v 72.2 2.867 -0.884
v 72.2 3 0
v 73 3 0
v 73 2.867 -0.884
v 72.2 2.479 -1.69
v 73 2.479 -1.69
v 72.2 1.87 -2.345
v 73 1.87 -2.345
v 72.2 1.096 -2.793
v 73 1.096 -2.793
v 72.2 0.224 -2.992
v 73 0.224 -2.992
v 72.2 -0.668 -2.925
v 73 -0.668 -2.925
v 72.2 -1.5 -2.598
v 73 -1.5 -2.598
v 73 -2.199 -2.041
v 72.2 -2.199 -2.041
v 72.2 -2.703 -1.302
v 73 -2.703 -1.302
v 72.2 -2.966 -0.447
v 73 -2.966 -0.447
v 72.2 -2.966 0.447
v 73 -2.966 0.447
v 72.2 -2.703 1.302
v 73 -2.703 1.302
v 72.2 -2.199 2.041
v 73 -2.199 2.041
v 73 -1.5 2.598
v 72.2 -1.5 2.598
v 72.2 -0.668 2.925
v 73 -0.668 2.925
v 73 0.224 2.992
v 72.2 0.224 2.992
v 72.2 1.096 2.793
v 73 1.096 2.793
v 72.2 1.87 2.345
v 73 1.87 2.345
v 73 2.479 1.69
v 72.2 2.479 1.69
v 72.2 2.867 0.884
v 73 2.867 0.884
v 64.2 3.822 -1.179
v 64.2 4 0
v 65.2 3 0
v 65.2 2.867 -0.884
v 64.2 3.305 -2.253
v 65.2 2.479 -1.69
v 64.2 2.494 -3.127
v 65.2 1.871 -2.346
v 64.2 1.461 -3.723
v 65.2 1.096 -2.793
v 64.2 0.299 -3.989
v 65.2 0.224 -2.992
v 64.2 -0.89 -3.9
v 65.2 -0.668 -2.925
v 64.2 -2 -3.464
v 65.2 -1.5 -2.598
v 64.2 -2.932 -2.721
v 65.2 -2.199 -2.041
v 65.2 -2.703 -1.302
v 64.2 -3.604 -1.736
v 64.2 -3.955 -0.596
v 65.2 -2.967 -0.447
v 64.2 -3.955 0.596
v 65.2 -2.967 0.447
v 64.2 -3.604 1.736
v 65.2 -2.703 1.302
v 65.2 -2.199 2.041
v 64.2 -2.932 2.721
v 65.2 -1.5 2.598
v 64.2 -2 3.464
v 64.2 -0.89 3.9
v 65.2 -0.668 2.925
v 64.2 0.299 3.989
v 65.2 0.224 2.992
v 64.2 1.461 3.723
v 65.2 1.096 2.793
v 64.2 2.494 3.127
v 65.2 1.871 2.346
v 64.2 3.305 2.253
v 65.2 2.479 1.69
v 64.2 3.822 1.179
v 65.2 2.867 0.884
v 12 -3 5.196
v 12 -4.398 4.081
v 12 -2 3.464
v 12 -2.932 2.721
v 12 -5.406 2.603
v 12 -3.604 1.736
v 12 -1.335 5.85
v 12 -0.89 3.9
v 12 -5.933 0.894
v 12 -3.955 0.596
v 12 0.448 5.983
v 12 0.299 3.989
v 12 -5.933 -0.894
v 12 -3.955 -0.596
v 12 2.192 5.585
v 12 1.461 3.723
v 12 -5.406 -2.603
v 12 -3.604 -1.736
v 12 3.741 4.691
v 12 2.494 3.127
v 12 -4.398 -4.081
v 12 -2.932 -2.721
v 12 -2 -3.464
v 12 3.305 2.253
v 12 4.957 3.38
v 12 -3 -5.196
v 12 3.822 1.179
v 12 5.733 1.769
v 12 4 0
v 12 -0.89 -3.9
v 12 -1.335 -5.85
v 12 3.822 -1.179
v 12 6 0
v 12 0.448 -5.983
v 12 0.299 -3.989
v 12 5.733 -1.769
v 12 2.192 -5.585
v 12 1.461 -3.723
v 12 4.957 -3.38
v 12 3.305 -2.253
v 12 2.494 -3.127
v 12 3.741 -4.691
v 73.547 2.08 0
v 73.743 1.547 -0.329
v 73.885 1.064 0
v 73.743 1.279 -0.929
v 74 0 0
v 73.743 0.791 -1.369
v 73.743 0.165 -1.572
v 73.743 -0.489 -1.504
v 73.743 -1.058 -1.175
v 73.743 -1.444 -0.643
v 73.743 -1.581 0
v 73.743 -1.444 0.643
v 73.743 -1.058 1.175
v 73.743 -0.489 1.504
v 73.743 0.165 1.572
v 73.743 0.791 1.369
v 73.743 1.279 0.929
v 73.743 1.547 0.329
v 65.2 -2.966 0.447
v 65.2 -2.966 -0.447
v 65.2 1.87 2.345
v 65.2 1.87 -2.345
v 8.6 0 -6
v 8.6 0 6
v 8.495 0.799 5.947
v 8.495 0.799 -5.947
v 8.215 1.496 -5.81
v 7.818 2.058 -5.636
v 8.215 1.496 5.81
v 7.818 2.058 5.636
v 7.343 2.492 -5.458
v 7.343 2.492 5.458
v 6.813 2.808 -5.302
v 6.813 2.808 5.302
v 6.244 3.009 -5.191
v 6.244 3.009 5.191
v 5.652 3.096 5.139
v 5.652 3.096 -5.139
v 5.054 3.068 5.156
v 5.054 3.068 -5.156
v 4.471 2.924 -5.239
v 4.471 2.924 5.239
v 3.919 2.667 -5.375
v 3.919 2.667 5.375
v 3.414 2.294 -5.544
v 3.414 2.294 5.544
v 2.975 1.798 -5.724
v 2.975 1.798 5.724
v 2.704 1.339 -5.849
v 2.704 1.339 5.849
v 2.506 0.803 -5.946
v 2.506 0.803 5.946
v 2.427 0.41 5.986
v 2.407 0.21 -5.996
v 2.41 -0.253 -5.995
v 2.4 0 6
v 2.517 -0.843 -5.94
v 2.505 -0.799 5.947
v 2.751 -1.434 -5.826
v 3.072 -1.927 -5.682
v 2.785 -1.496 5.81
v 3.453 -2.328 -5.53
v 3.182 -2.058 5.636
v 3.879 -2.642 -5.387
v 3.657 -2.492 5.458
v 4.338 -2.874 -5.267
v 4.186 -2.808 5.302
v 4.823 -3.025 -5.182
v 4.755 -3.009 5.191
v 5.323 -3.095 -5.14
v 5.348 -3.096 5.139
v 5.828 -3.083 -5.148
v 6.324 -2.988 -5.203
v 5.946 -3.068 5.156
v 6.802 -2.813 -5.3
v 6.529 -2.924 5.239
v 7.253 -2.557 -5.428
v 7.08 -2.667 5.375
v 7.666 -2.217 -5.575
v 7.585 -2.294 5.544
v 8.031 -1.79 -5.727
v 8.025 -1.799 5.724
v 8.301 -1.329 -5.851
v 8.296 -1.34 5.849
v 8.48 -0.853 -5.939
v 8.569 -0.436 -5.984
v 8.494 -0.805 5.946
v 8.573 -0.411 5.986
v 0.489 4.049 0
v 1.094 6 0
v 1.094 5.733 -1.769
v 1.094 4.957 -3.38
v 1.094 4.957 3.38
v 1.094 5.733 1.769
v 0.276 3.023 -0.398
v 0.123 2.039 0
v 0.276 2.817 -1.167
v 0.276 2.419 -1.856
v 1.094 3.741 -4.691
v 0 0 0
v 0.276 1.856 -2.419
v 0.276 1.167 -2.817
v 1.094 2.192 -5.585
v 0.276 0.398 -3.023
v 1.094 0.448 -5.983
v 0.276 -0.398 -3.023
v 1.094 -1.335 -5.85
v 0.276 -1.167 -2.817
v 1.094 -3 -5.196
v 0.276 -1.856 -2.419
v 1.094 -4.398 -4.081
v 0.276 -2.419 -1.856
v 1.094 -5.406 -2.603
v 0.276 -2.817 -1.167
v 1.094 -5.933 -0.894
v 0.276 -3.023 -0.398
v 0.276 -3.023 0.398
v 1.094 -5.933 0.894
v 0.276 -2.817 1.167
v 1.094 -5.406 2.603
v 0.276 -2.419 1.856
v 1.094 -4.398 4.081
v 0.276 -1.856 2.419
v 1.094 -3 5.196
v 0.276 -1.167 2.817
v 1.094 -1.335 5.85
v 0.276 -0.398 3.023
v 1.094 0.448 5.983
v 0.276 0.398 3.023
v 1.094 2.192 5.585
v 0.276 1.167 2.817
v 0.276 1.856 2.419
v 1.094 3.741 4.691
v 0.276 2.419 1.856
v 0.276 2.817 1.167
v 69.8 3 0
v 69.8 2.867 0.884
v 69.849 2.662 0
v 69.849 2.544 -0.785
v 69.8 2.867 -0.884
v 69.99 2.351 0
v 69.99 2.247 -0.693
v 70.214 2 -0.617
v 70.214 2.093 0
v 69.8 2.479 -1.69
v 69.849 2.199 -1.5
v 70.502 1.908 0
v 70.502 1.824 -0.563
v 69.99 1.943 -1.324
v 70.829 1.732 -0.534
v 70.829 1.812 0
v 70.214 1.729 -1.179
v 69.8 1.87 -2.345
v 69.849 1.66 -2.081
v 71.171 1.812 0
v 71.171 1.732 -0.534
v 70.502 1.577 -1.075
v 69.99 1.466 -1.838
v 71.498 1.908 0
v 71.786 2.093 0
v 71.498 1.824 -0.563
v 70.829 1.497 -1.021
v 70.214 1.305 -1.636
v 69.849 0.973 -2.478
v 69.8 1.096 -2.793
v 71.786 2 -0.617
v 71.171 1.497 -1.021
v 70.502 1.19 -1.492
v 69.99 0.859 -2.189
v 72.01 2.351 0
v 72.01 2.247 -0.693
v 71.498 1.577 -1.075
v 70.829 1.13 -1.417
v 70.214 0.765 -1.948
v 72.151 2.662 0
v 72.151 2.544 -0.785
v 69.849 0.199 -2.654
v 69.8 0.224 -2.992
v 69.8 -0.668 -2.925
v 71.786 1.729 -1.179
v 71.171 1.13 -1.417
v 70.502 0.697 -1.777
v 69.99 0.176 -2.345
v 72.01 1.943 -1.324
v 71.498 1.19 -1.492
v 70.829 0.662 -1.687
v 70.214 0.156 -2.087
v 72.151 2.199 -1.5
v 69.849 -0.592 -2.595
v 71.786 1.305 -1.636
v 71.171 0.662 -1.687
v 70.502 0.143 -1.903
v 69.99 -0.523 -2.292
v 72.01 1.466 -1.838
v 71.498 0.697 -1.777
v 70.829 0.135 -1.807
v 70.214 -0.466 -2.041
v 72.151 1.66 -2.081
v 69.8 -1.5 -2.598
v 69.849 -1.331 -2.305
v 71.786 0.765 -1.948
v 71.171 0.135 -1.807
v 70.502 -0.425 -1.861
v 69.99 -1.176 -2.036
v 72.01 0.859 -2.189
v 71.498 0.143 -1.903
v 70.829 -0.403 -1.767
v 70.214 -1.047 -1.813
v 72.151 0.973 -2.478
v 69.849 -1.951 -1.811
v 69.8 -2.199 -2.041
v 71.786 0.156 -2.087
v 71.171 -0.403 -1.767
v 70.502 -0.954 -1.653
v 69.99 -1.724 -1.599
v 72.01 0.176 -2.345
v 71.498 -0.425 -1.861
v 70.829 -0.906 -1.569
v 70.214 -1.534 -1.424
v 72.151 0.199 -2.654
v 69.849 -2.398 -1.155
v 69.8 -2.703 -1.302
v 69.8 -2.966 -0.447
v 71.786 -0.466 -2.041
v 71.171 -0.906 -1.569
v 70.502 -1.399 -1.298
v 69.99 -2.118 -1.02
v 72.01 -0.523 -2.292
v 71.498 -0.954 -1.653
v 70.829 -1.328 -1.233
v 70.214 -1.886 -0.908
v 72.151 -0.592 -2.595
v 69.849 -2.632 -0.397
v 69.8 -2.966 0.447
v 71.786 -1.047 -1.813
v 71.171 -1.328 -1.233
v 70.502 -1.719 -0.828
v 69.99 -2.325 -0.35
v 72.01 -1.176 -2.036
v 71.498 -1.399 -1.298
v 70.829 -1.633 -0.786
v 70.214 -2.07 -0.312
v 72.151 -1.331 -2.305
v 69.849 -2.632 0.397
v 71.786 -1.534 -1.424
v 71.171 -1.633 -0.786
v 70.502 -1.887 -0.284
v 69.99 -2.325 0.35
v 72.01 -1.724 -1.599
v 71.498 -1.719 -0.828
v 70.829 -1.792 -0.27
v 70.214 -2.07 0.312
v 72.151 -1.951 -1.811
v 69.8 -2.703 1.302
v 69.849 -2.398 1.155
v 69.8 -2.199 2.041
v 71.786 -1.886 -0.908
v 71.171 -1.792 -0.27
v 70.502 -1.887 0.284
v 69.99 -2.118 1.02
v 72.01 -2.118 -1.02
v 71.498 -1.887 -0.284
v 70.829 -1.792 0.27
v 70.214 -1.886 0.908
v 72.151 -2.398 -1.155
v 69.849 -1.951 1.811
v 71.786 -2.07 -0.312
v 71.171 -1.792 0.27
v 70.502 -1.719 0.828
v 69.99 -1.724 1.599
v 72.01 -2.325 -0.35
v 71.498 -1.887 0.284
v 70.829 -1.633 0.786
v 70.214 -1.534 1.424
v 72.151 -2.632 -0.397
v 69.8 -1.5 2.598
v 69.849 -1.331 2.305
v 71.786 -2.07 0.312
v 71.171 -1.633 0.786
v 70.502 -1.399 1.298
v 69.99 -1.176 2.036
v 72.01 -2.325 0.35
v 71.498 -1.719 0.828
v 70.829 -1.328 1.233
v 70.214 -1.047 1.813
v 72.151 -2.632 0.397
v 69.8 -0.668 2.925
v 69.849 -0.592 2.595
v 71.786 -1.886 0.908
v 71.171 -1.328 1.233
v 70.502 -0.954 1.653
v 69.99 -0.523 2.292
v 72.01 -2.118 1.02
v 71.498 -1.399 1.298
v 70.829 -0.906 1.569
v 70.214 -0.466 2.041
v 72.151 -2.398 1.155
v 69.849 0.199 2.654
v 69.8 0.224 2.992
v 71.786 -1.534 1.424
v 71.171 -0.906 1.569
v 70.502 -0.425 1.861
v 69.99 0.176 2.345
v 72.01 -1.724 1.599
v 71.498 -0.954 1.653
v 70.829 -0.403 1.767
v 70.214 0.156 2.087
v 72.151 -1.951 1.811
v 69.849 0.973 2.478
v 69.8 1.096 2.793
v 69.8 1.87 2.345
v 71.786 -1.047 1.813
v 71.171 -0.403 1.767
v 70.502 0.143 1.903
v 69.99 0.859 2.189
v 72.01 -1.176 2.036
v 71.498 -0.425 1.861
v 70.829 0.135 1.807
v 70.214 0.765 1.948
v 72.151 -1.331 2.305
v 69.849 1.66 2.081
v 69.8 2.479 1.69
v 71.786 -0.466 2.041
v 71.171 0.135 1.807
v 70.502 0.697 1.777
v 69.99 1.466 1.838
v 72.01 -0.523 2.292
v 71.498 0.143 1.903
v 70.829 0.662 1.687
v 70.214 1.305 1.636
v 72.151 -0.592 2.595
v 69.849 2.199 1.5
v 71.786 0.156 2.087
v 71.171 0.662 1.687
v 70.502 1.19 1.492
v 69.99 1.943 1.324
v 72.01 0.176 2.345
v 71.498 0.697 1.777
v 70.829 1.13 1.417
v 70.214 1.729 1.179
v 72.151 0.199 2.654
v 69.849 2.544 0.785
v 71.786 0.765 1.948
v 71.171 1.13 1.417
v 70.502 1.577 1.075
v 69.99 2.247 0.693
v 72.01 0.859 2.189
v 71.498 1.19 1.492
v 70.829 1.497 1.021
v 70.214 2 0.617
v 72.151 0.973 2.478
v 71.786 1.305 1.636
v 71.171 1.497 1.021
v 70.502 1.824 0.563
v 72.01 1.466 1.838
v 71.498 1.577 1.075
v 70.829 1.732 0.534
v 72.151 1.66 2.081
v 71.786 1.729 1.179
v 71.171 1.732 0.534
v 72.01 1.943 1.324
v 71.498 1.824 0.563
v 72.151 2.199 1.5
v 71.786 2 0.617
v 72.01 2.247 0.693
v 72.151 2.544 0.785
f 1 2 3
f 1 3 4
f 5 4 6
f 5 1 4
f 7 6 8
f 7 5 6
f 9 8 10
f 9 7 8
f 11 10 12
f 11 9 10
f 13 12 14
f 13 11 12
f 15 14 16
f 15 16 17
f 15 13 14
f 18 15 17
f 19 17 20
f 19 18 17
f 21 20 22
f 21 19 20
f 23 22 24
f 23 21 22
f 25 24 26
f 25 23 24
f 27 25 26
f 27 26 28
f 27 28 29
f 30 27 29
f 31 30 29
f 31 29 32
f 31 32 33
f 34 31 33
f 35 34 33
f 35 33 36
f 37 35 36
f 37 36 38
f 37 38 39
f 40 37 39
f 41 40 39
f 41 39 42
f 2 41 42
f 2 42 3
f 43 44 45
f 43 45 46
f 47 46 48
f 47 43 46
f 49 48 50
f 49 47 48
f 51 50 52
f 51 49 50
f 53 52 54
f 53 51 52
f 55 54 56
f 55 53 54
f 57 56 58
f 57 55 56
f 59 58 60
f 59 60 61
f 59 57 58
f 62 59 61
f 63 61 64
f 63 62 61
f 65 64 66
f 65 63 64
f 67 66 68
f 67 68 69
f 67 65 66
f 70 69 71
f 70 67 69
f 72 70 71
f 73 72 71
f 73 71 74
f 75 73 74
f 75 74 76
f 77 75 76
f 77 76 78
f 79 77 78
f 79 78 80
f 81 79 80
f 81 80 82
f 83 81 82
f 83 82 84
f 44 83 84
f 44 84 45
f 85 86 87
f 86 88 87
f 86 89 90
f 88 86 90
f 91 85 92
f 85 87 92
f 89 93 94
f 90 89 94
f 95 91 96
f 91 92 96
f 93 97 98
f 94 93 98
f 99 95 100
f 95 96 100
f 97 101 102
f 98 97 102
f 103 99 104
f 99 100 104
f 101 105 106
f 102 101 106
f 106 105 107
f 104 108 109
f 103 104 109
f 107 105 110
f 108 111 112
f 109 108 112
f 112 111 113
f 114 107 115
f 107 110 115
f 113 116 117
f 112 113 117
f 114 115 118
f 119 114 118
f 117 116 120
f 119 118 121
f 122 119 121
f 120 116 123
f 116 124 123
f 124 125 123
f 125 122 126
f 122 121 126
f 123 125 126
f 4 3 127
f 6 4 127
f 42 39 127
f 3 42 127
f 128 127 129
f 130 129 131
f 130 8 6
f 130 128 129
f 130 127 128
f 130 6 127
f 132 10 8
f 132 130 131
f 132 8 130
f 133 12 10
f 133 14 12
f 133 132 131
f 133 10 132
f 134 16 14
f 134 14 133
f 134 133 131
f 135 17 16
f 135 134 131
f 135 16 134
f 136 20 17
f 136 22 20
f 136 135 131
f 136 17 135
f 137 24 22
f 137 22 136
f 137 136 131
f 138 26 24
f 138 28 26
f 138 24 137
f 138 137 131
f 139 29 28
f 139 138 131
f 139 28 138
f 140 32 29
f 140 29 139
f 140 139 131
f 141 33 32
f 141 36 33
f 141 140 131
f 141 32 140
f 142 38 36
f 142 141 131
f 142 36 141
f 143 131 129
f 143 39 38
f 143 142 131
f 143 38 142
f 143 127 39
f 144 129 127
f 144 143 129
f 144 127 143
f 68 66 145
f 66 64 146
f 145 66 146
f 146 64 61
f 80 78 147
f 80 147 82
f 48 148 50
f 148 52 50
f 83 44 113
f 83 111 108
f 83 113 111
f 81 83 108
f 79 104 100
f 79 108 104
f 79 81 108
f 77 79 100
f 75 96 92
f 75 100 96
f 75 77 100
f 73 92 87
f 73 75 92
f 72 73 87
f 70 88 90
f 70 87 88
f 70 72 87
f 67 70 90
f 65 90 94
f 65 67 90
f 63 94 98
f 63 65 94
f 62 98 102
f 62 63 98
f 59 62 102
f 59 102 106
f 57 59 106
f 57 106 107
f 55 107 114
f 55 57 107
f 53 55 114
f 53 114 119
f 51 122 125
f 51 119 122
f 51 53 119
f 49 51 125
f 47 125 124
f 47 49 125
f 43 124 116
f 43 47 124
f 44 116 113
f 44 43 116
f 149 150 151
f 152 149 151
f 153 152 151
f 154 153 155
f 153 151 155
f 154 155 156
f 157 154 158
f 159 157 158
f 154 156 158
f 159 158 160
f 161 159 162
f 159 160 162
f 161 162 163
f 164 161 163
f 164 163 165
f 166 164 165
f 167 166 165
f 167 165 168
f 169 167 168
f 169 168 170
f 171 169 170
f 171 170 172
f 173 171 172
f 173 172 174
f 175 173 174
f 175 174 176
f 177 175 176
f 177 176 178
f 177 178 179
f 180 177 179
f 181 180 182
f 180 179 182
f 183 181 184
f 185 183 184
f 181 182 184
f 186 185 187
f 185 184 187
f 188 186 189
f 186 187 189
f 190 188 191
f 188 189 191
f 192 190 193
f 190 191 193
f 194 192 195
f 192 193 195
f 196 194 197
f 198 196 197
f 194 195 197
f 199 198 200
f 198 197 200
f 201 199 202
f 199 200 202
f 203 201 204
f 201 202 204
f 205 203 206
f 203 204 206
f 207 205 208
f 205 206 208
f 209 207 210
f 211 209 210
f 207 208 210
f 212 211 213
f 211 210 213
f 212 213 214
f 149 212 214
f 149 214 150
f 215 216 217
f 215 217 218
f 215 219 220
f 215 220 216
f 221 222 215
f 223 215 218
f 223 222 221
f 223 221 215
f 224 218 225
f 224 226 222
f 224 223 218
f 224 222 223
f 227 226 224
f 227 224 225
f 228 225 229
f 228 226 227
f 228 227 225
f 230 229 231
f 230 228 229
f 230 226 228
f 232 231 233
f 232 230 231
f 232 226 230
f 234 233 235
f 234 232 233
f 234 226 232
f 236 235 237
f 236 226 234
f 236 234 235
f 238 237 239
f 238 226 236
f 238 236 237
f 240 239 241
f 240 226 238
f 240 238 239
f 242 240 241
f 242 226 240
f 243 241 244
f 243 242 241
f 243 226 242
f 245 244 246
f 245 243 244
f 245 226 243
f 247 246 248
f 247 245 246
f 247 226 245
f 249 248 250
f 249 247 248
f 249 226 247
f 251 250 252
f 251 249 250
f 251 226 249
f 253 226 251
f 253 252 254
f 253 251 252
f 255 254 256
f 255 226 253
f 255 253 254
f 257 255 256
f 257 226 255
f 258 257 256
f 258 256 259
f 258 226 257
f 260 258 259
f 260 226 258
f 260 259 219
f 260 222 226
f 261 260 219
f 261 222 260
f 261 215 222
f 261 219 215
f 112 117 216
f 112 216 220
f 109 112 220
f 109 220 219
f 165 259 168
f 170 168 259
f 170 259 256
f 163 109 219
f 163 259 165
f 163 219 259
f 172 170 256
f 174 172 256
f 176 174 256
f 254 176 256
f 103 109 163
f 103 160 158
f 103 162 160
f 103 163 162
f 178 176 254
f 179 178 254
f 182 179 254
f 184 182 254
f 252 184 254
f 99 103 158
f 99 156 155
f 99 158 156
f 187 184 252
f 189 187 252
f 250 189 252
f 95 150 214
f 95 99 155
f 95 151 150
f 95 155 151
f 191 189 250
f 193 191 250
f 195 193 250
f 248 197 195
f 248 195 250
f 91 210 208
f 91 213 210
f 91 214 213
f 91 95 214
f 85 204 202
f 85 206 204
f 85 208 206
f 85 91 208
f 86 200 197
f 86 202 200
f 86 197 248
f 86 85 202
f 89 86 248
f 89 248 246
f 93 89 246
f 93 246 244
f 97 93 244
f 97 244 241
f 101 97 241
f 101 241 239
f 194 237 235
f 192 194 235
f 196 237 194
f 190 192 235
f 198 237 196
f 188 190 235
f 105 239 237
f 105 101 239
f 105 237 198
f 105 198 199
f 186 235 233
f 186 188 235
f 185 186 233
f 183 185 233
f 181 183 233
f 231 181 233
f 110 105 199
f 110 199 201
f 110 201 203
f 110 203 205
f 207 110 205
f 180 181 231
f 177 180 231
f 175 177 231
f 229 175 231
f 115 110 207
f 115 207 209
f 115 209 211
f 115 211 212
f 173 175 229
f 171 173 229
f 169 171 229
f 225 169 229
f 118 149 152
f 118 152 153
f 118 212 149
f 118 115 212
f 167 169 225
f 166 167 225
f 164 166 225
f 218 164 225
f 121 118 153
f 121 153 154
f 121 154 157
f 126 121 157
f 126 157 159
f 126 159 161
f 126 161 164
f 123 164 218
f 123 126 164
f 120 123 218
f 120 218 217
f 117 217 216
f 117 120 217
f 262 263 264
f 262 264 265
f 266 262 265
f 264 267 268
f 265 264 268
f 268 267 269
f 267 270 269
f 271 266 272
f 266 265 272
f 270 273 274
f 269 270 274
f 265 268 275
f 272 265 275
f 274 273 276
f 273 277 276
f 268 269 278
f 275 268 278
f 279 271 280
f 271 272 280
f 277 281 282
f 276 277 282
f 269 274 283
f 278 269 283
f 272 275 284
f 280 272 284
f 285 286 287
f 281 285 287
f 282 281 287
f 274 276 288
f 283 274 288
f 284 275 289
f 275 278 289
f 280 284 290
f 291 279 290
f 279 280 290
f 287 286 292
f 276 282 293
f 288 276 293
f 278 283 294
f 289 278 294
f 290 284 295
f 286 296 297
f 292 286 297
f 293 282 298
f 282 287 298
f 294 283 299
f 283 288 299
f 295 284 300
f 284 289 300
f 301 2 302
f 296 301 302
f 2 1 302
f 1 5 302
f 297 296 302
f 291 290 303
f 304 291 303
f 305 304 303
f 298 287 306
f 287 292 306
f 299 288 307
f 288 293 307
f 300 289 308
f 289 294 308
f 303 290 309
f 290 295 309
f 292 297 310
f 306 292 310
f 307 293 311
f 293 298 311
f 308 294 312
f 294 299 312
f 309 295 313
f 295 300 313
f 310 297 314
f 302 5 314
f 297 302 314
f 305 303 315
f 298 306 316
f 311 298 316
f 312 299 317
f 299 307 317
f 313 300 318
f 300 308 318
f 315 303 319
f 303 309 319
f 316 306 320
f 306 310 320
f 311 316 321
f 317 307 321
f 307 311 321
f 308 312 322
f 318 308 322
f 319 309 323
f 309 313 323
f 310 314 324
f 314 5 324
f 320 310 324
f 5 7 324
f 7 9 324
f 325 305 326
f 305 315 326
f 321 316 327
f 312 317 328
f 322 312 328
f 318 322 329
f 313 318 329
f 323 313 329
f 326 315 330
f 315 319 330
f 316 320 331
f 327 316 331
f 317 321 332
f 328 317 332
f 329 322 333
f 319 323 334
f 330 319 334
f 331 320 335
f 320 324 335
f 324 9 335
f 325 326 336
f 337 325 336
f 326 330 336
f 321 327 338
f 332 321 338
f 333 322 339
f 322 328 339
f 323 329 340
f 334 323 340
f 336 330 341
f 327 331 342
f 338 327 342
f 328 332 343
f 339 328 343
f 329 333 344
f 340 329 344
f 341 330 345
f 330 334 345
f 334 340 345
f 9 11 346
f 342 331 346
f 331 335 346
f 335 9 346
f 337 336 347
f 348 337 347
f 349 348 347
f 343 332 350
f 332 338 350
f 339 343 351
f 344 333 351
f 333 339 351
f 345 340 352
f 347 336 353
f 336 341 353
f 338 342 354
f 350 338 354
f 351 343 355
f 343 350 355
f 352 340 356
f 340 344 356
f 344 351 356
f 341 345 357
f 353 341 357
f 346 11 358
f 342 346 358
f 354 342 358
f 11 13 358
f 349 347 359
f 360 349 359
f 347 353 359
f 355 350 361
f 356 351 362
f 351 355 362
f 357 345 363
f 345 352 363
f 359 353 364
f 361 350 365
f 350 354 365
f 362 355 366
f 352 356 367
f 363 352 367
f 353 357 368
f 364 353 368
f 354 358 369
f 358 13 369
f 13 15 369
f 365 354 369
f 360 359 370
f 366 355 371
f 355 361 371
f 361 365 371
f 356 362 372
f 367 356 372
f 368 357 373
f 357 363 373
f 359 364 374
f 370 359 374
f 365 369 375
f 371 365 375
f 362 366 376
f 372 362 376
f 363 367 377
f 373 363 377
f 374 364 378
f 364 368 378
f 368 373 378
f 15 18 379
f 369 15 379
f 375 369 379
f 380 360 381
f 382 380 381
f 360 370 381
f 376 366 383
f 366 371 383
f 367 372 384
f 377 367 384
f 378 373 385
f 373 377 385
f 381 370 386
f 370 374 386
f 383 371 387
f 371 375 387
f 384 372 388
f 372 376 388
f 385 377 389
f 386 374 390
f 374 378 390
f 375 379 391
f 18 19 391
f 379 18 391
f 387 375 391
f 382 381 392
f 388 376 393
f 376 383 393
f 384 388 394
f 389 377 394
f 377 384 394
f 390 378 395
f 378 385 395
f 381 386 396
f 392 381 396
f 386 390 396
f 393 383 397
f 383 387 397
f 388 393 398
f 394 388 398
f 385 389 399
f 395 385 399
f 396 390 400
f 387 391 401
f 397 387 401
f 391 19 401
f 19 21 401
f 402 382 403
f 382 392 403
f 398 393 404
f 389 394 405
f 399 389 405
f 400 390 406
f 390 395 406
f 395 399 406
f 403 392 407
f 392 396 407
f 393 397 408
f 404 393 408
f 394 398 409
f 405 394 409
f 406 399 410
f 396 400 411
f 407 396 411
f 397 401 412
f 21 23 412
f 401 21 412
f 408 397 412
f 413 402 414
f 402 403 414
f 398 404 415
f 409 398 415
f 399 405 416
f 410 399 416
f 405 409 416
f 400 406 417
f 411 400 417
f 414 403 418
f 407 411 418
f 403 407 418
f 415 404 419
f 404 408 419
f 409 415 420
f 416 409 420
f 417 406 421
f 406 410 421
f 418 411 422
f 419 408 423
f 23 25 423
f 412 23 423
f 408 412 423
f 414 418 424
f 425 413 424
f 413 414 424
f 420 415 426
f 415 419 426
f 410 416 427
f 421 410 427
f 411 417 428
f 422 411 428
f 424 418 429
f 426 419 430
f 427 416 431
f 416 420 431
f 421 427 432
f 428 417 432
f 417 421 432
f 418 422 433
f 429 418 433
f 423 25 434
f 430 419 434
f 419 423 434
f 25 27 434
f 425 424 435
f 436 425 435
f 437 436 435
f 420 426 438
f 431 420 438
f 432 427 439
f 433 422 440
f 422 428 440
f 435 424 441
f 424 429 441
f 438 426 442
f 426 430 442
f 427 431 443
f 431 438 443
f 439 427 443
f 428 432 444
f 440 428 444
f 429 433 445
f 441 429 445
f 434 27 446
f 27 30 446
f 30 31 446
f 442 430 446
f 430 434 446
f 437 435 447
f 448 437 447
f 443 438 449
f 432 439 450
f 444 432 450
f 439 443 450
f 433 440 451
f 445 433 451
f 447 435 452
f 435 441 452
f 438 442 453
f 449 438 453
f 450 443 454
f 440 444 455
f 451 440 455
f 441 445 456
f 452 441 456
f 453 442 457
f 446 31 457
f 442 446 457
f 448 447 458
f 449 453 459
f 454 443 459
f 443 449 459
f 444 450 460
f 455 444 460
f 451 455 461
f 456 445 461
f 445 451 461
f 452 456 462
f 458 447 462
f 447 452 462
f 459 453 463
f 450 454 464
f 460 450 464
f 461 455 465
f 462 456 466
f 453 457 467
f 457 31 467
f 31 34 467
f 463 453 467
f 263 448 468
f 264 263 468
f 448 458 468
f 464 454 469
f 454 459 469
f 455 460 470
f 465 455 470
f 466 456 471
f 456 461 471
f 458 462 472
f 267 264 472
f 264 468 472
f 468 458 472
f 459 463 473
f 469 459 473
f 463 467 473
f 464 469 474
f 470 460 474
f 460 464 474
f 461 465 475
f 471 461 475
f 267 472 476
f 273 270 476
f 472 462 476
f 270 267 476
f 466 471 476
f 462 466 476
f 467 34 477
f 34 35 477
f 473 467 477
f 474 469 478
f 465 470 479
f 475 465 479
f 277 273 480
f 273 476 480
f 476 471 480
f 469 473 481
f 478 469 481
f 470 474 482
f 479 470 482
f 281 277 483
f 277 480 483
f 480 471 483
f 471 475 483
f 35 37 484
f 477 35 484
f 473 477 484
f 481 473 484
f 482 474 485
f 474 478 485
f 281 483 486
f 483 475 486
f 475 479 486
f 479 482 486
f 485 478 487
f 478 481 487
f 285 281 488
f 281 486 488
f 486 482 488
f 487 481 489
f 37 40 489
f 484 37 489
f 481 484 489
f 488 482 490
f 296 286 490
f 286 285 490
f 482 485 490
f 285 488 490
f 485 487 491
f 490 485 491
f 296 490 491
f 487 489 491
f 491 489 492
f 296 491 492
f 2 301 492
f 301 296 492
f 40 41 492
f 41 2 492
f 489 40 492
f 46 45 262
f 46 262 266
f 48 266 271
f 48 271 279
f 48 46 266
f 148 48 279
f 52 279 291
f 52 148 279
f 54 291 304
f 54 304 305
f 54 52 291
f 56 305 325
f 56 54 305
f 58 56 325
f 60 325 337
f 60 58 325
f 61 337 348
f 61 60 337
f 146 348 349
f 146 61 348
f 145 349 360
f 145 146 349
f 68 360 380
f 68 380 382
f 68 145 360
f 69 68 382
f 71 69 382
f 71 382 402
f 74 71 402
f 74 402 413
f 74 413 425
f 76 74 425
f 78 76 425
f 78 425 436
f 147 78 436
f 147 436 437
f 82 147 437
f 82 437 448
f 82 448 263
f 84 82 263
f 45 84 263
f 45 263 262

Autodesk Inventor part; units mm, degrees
ref_plane "YZ Plane" through (0, 0, 0) normal (1, 0, 0) x (0, 1, 0)
ref_plane "XZ Plane" through (0, 0, 0) normal (0, 1, 0) x (-1, 0, 0)
sketch "Sketch1" plane through (0, 0, 0) normal (0, 0, 1) x (1, 0, 0)
  line L0 (0, 0) -> (74, 0)
  line L1 (0, 0) -> (17, 0)
  circle A0 centre (17, 0) radius 17
  line L2 (0, 0) -> (0, 12)
  line L3 (74, 0) -> (69, 0)
  circle A1 centre (69, 0) radius 5
  line L4 (74, 0) -> (74, 3)
  line L5 (74, 3) -> (65.2, 3)
  line L6 (65.2, 3) -> (65.2, 0)
  line L7 (65.2, 0) -> (74, 0)
  line L8 (74, 0) -> (74, 3)
  line L9 (74, 3) -> (69.8, 3)
  line L10 (69.8, 3) -> (69.8, 3)
  line L11 (69.8, 0) -> (74, 0)
  line L12 (74, 0) -> (74, 3)
  line L13 (74, 0) -> (69.8, 0)
  line L14 (69.8, 0) -> (69.8, 1.8)
  line L15 (71, 1.8) -> (74, 1.8)
  line L16 (74, 1.8) -> (74, 0)
  arc A2 (69.8, 3) -> (71, 1.8) centre (71, 3) ccw
  line L17 (71, 1.8) -> (71, 1.8)
  line L18 (72.2, 3) -> (72.2, 3)
  arc A3 (71, 1.8) -> (72.2, 3) centre (71, 3) ccw
  line L19 (65.2, 0) -> (12, 0)
  line L20 (12, 0) -> (12, 4)
  line L21 (12, 4) -> (65.2, 4)
  line L22 (65.2, 4) -> (65.2, 0)
  line L23 (12, 0) -> (0, 0)
  line L24 (0, 0) -> (0, 6)
  line L25 (0, 6) -> (12, 6)
  line L26 (12, 6) -> (12, 0)
  line L27 (12, 6) -> (5.5, 6)
  line L28 (5.5, 6) -> (5.5, 0)
  point P0 (72.2, 1.8)
  point P1 (1.094, 6)
  point P2 (73, 3)
  dimension "d0" = 74
  dimension "d1" = 17
  dimension "d2" = 12
  dimension "d3" = 5
  dimension "d4" = 3
  dimension "d5" = 8.8
  dimension "d6" = 4.2
  dimension "d7" = 1.8
  dimension "d8" = 1.2
  dimension "d9" = 1.2
  dimension "d10" = 1.2
  dimension "d11" = 53.2
  dimension "d12" = 4
  dimension "d13" = 6
  dimension "d14" = 6.5
revolve "Revolution1" add sketch "Sketch1" angle 360 about axis through (65.2, 0, 0) along (-1, 0, 0) contours A0 L25 L28 L0 | L28 L25 L26 L20 L0 | A0 L21 L22 A1 L0 | L0 L20 L21 A0 | A1 L22 L6 L0 | L6 L5 A2 L15 A1 L0 | A1 L15 A3 L5
chamfer "Chamfer1" distance 1 angle 45 1 edges at (65.2, -4, 0)
ref_plane "Work Plane1" through (6.547, 0, 6) normal (0, 0, 1) x (1, 0, 0)
sketch "Sketch2" plane through (6.547, 0, 6) normal (0, 0, 1) x (1, 0, 0)
  line L0 (5.453, 4) -> (5.453, -4) projected
  line L1 (5.453, 0) -> (-1.047, 0)
  circle A0 centre (-1.047, 0) radius 3.1
  point P0 (-6.547, 0)
  dimension "d19" = 6.5
  dimension "d20" = 6.2
extrude "Extrusion1" cut sketch "Sketch2" against normal through all
thread "Thread1" size "M8x1.25" class "6g" standard "ANSI Metric M Profile" length 49.2
properties part number "Menetesorsó"
